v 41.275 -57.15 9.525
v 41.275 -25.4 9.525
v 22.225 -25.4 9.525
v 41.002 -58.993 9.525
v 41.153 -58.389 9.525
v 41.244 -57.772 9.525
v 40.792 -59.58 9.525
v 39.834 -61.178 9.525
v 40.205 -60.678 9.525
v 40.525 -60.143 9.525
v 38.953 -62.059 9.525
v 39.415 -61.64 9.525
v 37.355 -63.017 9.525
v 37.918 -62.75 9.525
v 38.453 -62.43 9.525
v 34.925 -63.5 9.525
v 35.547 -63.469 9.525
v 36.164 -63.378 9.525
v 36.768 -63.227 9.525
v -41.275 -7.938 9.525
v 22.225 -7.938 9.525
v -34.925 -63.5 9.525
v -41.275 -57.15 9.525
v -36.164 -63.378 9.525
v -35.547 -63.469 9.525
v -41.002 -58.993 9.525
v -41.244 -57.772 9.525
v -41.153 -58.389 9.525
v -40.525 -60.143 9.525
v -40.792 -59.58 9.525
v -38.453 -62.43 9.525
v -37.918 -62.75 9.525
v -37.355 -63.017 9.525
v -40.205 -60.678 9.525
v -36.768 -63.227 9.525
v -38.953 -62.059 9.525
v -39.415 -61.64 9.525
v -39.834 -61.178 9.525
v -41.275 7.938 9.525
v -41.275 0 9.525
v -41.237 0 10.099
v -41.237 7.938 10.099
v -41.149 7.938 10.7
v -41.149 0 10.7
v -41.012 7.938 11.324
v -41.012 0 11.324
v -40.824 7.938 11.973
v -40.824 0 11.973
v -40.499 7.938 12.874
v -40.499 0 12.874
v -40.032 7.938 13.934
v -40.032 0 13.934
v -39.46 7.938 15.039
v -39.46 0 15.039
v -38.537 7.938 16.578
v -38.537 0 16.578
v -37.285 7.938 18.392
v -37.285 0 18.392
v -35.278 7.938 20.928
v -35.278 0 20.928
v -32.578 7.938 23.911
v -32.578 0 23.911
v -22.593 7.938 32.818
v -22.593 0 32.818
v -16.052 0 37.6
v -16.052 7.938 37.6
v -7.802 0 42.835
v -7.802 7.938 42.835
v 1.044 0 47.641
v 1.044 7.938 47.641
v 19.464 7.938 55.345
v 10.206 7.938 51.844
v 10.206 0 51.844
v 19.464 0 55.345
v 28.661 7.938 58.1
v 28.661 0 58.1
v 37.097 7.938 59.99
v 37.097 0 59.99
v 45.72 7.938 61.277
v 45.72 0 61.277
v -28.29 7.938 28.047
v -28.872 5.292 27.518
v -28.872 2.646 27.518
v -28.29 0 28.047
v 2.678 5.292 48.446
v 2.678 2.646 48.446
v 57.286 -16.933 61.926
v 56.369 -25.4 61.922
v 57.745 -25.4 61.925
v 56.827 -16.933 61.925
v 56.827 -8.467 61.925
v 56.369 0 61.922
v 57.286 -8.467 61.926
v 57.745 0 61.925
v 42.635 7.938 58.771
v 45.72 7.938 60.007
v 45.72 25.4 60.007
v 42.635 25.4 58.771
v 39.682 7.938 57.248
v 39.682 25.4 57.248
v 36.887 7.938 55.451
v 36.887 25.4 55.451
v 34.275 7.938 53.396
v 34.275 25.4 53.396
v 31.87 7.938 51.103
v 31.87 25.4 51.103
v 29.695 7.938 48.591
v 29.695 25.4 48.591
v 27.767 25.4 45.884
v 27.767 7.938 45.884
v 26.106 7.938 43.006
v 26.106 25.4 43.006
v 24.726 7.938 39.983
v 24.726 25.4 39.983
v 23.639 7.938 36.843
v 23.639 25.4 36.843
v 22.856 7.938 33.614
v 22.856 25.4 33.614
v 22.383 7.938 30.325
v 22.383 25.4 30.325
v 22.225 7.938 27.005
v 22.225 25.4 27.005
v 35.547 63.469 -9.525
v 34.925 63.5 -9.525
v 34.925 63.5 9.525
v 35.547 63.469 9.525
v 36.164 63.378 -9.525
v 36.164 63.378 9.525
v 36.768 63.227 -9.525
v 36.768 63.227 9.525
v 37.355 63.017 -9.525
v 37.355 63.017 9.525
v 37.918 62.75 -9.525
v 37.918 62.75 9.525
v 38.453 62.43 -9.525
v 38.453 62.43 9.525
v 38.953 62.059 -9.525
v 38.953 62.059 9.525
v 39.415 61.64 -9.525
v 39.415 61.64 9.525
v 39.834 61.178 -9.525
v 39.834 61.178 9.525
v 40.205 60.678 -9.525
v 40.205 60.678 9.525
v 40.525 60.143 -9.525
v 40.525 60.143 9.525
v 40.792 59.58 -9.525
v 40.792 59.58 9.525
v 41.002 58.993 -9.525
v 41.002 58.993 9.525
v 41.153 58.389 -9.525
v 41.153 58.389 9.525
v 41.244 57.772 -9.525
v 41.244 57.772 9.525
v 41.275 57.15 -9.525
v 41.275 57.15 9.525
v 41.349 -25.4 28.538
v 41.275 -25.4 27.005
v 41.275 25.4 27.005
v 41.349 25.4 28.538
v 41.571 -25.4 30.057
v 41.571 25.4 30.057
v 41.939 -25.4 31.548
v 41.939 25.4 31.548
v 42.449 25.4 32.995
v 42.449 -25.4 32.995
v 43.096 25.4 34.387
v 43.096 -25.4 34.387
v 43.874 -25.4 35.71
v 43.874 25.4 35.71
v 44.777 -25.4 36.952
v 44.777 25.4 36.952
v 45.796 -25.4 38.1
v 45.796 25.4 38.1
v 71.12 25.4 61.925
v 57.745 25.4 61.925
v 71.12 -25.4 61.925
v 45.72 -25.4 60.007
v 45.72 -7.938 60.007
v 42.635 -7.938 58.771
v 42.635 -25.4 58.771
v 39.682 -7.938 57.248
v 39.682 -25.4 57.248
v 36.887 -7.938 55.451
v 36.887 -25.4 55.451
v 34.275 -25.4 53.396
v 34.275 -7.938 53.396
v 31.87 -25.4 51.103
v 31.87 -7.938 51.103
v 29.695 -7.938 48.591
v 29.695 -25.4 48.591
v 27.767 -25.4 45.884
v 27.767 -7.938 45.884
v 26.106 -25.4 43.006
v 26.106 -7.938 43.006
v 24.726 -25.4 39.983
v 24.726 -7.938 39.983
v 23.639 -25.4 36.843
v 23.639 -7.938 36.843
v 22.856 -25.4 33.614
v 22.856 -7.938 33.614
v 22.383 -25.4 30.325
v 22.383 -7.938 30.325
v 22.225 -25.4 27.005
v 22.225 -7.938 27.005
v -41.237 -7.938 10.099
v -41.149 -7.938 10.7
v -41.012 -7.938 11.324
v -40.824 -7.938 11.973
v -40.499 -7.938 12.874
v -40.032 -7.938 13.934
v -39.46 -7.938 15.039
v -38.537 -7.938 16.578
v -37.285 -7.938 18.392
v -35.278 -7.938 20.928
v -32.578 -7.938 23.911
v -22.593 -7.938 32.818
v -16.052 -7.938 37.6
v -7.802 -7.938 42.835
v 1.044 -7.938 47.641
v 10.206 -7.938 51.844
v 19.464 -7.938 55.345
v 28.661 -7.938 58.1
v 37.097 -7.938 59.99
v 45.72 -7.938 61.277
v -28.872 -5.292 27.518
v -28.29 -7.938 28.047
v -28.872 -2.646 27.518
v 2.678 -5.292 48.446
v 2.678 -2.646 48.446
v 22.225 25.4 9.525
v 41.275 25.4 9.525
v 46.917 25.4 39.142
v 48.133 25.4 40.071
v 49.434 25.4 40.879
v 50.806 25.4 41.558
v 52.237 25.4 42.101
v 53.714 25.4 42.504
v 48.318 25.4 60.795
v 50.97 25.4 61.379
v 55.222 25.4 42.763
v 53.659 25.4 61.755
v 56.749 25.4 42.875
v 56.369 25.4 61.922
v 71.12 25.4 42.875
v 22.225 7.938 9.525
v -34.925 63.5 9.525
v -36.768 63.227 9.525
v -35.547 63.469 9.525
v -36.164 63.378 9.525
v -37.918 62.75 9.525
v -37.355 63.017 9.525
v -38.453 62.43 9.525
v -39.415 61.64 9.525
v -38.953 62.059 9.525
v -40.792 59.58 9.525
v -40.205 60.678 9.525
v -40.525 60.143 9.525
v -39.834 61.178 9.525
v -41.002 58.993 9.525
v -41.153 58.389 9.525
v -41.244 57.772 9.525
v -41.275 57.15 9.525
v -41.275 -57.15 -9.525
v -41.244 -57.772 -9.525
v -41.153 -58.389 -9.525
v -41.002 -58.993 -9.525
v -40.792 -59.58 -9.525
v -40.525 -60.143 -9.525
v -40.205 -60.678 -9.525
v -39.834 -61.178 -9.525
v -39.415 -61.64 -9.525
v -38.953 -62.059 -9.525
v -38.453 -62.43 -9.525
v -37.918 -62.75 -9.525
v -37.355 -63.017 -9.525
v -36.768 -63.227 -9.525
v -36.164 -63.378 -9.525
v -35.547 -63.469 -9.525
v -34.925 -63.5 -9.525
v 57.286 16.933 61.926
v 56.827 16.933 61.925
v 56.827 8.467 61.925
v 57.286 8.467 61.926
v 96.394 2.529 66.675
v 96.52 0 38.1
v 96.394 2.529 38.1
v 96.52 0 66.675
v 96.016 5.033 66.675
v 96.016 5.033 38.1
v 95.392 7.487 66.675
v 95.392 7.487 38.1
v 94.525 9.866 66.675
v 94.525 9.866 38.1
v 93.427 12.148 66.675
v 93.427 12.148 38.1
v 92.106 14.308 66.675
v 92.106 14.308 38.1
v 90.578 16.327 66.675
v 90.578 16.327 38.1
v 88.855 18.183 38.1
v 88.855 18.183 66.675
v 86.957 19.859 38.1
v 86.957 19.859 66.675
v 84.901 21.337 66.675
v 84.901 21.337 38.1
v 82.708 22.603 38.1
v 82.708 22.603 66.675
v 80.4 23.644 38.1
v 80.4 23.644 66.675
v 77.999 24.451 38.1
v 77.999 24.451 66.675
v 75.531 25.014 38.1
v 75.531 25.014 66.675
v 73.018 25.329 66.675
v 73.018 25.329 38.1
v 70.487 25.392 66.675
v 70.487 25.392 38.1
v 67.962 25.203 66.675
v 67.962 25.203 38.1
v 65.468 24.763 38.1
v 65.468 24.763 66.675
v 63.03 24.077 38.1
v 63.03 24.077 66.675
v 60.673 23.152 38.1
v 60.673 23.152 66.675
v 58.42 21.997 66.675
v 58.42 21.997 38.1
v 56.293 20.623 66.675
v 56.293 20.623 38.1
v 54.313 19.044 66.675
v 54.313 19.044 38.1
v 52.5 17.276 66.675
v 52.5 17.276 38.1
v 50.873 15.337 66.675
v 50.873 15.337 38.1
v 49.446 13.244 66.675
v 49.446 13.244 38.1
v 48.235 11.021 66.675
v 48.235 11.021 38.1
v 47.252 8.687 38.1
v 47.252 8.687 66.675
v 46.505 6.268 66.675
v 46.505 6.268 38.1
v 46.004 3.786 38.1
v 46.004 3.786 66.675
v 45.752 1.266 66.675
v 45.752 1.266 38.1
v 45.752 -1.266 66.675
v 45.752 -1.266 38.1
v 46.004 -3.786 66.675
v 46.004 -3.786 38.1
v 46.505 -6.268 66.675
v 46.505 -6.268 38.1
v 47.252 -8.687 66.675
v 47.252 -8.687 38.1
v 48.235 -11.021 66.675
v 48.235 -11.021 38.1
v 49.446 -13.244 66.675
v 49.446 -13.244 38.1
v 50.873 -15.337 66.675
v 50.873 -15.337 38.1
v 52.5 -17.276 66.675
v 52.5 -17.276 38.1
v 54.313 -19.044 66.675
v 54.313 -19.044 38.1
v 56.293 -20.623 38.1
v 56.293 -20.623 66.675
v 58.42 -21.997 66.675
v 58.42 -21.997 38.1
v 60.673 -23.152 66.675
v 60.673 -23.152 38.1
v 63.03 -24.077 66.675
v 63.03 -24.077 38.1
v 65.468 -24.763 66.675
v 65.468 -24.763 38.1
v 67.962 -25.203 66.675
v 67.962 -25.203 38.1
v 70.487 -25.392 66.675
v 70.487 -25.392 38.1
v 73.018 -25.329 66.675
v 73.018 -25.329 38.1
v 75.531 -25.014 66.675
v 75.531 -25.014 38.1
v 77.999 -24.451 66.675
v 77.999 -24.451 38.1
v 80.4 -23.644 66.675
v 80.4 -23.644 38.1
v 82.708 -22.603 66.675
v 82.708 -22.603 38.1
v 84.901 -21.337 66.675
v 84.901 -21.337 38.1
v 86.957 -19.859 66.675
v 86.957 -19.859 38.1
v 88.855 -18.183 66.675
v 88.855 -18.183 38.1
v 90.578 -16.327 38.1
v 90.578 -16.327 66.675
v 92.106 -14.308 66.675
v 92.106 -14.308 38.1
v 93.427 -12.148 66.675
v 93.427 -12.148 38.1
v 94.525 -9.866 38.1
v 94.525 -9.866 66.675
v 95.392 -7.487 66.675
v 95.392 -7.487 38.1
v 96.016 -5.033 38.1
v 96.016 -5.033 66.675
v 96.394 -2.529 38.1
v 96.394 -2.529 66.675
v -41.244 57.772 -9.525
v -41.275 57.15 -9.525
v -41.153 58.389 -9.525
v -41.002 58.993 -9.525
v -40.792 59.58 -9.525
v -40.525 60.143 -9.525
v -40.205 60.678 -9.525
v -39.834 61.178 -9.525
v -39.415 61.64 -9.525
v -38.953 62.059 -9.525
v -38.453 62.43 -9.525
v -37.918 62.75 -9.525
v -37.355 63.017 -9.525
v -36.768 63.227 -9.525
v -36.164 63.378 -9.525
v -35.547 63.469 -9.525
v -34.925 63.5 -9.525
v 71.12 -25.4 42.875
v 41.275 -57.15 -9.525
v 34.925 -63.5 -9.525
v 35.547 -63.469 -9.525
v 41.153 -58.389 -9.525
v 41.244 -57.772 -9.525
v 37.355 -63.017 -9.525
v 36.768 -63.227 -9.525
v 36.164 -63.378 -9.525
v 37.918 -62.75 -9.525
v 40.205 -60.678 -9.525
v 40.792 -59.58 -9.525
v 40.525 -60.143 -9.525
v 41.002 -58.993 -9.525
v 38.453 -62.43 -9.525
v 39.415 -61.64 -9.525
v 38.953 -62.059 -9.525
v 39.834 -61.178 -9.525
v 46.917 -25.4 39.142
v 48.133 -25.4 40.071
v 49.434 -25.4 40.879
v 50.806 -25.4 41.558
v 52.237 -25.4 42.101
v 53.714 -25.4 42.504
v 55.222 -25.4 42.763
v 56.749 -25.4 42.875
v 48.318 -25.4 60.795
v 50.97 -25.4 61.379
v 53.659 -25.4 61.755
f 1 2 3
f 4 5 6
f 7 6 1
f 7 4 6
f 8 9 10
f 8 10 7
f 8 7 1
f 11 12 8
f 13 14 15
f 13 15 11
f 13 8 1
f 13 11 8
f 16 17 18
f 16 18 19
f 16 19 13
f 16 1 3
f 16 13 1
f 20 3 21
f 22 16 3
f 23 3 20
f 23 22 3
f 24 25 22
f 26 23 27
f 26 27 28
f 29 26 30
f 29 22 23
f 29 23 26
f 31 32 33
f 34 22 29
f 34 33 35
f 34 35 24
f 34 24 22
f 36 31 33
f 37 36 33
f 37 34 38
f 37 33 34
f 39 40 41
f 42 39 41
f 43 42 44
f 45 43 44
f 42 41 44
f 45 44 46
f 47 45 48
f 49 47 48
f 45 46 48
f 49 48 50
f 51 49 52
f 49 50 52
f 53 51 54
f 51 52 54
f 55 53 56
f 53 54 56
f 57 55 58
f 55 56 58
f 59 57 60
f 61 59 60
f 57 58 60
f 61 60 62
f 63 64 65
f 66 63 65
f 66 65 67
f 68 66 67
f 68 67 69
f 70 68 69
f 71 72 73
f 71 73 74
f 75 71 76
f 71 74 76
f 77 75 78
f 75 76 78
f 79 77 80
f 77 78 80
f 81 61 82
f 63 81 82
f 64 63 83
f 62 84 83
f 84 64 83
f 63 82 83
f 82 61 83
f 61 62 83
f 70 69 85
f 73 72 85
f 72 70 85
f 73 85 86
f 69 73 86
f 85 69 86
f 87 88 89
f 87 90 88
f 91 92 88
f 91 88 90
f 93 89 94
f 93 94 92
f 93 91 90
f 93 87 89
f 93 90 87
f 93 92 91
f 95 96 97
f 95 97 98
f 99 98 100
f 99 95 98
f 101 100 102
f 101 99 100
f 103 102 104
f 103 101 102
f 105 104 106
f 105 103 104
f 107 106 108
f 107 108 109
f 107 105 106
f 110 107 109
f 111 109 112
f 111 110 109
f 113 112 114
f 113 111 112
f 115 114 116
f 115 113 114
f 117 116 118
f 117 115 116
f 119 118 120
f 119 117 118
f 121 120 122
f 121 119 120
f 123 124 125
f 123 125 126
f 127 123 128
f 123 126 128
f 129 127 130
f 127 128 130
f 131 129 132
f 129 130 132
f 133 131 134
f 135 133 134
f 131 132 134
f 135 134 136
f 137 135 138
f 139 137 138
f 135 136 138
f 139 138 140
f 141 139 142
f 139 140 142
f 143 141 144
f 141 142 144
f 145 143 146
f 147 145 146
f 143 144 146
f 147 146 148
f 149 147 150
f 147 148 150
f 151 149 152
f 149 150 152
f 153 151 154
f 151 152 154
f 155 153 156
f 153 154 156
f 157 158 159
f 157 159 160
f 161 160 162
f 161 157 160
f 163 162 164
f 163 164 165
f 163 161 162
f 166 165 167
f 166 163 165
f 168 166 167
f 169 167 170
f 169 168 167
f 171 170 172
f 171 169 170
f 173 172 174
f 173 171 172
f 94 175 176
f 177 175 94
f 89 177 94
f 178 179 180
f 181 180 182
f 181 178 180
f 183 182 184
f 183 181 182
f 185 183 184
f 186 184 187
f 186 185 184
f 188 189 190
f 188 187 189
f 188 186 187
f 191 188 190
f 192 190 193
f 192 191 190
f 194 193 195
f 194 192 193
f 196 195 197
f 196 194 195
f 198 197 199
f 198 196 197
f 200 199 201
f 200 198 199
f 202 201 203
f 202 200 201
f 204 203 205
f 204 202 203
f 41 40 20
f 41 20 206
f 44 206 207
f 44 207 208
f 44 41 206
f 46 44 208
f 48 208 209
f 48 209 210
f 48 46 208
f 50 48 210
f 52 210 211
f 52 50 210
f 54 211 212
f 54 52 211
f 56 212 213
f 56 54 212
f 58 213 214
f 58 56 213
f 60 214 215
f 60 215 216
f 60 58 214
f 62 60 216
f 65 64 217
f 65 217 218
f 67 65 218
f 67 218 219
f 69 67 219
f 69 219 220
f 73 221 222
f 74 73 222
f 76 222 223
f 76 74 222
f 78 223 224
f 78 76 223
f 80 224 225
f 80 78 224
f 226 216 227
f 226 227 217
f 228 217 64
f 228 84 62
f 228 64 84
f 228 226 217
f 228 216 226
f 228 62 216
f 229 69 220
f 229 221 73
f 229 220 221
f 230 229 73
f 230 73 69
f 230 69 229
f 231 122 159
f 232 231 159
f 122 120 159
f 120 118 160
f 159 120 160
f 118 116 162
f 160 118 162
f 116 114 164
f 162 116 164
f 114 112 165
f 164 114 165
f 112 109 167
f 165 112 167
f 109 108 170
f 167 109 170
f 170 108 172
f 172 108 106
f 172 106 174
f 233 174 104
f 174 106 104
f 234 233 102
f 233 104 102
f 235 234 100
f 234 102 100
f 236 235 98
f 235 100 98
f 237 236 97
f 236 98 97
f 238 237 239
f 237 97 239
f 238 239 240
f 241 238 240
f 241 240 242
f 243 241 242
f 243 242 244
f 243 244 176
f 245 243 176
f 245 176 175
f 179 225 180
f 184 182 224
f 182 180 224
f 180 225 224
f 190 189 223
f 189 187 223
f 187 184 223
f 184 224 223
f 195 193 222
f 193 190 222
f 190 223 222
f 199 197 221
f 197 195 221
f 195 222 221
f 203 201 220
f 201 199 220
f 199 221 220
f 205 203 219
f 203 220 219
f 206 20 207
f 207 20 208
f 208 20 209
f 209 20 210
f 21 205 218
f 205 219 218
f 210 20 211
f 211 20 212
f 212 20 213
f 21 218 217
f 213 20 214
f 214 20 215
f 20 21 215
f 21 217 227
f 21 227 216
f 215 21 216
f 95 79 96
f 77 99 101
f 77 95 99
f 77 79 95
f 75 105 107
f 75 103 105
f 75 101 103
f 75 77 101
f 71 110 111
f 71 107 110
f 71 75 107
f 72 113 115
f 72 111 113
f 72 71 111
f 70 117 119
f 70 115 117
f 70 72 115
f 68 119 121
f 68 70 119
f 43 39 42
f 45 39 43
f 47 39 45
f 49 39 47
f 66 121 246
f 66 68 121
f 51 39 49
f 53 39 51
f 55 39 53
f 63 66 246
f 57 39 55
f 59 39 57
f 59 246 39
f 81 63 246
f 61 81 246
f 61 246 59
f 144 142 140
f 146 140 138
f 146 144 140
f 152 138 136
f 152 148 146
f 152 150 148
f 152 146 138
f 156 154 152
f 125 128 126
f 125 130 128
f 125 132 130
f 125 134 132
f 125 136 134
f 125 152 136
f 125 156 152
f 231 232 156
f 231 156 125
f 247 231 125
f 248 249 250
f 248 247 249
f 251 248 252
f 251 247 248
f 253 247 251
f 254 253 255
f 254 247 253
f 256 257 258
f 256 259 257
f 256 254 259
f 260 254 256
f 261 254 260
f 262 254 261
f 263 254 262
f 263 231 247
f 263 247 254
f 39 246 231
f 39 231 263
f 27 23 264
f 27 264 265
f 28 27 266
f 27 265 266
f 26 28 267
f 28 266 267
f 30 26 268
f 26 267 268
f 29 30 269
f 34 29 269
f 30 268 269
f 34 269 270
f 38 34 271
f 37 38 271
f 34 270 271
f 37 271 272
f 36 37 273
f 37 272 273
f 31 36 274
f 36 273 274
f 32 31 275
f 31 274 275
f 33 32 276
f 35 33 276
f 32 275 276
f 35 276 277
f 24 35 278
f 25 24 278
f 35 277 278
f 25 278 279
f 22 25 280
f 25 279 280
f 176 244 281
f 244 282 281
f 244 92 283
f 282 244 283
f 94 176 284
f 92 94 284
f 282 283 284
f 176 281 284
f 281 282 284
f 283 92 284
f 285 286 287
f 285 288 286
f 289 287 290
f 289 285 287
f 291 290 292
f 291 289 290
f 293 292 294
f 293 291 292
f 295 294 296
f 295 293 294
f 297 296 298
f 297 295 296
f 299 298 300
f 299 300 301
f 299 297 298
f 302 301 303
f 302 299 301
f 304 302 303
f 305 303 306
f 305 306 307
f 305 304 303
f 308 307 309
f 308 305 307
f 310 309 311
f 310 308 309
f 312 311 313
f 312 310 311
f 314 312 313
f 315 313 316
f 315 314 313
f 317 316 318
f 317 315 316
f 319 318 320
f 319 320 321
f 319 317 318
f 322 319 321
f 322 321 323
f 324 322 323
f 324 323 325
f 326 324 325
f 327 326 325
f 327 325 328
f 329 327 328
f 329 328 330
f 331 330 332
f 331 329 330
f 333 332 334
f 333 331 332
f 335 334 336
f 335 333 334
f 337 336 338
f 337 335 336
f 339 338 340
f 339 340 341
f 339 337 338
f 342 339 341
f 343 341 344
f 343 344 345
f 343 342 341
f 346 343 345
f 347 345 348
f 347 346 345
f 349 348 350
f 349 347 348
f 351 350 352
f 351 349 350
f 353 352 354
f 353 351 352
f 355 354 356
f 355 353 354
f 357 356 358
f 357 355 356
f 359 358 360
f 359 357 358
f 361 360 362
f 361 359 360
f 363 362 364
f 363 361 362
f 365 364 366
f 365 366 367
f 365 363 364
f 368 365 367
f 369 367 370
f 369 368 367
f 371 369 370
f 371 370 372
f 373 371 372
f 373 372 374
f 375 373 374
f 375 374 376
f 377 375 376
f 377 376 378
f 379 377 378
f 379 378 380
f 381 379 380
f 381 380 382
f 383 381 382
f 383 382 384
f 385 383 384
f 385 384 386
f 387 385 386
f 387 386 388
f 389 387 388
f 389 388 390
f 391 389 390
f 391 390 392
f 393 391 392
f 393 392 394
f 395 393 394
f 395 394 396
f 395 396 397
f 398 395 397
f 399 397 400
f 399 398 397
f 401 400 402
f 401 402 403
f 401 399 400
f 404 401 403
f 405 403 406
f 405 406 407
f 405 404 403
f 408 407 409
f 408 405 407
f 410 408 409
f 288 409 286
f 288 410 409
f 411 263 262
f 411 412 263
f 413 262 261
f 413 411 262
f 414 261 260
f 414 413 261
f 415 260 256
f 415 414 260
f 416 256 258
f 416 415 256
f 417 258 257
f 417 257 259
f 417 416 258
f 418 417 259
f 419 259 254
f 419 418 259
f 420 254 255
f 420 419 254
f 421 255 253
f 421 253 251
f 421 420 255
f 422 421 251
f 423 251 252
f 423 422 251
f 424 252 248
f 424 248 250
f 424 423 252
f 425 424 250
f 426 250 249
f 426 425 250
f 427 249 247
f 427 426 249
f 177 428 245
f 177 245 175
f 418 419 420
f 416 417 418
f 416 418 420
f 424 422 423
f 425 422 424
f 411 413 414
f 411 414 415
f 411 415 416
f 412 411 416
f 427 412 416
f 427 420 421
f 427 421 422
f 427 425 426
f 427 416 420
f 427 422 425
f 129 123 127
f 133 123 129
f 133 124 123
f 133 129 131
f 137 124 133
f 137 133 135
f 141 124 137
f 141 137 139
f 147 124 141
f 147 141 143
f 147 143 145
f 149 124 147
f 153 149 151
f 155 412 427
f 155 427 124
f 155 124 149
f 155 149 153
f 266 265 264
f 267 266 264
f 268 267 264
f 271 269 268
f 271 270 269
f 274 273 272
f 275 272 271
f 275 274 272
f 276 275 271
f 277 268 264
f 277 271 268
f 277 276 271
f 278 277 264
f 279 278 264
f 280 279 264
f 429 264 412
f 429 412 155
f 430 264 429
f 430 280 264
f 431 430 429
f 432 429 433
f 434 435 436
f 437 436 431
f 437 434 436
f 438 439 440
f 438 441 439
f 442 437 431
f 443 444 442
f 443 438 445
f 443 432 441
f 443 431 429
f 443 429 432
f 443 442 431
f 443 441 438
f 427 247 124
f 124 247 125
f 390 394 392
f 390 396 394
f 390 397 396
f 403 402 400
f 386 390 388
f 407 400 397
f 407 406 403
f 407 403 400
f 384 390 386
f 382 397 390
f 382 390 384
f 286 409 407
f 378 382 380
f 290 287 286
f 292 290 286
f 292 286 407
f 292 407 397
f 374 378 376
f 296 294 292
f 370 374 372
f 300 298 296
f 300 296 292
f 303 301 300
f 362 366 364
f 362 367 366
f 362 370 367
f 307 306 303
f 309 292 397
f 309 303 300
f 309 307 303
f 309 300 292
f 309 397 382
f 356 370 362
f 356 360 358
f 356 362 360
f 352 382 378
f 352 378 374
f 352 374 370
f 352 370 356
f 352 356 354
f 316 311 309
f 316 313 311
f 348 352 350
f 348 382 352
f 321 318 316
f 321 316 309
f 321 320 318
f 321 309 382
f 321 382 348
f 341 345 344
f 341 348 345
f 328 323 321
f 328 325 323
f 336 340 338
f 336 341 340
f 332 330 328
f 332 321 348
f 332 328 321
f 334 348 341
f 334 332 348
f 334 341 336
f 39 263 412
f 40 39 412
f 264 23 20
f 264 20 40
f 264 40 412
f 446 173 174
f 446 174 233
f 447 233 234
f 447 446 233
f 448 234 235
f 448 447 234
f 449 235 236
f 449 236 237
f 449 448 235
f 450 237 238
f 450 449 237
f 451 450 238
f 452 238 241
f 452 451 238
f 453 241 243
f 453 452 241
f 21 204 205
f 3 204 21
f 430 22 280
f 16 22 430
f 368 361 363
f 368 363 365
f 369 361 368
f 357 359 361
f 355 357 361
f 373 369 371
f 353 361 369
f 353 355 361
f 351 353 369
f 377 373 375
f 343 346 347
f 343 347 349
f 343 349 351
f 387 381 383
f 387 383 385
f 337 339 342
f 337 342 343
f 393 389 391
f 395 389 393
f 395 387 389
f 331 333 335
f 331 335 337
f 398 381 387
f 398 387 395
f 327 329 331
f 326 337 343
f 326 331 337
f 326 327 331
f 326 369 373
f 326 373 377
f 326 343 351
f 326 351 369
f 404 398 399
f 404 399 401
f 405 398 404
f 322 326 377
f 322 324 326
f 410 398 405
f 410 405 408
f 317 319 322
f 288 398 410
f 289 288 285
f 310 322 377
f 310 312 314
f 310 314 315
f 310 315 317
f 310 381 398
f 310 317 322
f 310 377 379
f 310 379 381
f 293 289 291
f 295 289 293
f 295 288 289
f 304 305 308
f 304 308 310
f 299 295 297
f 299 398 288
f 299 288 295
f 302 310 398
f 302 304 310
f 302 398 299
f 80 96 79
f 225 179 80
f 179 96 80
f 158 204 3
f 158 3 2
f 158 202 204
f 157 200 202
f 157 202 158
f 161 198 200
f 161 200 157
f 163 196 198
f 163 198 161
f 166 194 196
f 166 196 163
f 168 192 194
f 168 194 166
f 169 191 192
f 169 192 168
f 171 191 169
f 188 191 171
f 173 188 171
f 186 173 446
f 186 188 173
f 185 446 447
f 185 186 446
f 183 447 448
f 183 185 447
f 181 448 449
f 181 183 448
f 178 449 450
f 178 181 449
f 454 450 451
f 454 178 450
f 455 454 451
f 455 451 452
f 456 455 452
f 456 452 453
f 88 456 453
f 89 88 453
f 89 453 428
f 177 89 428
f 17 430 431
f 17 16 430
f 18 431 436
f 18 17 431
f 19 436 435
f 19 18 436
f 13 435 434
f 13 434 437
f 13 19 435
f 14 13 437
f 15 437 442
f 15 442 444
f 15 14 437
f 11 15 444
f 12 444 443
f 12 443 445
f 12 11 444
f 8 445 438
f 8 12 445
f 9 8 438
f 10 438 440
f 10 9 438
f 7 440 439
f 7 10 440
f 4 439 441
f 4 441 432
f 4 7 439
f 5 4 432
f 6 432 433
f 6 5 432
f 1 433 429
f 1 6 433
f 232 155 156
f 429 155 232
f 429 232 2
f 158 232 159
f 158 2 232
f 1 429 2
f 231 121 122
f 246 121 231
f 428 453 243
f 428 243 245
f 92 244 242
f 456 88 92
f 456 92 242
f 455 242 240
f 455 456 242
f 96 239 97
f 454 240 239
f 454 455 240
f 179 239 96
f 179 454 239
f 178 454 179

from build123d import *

# Parameters (mm, degrees)
F1_DEPTH = 63.5
F2_DEPTH = 25.4
F3_DEPTH = 7.9375
F5_R     = 6.35


with BuildPart() as f1:
    # F0 (on Front) → F1 (new body, symmetric)
    with BuildSketch(Plane.XZ):
        Polygon((22.225, 9.525), (-41.275, 9.525), (-41.275, -9.525), (41.275, -9.525), (41.275, 9.525), align=None)
    extrude(amount=F1_DEPTH, both=True)

    # F0 (on Front) → F2 (join, symmetric)
    with BuildSketch(Plane.XZ):
        with BuildLine():
            Line((22.225, 27.005265), (22.225, 9.525))
            Line((22.225, 9.525), (41.275, 9.525))
            Line((41.275, 9.525), (41.275, 27.005265))
            ThreePointArc((41.275, 27.005265), (42.448524, 32.995443), (45.795596, 38.1))
            Line((45.795596, 38.1), (45.72, 38.1))
            Line((45.72, 38.1), (45.72, 60.006943))
            ThreePointArc((45.72, 60.006943), (28.69874, 47.26067), (22.225, 27.005265))
        make_face()
        with BuildLine():
            ThreePointArc((56.369008, 61.921532), (50.969911, 61.379124), (45.72, 60.006943))
            Line((45.72, 60.006943), (45.72, 38.1))
            Line((45.72, 38.1), (45.795596, 38.1))
            ThreePointArc((45.795596, 38.1), (50.805869, 41.557503), (56.749004, 42.8752))
            Line((56.749004, 42.8752), (71.12, 42.8752))
            Line((71.12, 42.8752), (71.12, 61.9252))
            Line((71.12, 61.9252), (57.7448, 61.9252))
            add(Edge.make_bspline(
                [(56.369008, 61.921532), (56.827318, 61.92587), (57.285926, 61.927108), (57.7448, 61.9252)],
                knots=[111.022009, 111.022009, 111.022009, 111.022009, 112.029914, 112.029914, 112.029914, 112.029914], degree=3))
        make_face()
    extrude(amount=F2_DEPTH, both=True)

    # F0 (on Front) → F3 (join, symmetric)
    with BuildSketch(Plane.XZ):
        with BuildLine():
            add(Edge.make_bspline(
                [(-41.275, 9.525), (-40.999132, 22.371612), (-0.51452, 56.173199), (45.72, 61.276772)],
                knots=[0, 0, 0, 0, 103.164616, 103.164616, 103.164616, 103.164616], degree=3))
            Line((-41.275, 9.525), (22.225, 9.525))
            Line((22.225, 9.525), (22.225, 27.005265))
            ThreePointArc((22.225, 27.005265), (28.69874, 47.26067), (45.72, 60.006943))
            Line((45.72, 60.006943), (45.72, 61.276772))
        make_face()
    extrude(amount=F3_DEPTH, both=True)

    # F5
    f5_edges = [f1.edges().sort_by_distance(p)[0] for p in [
        (-41.275, -63.5, 0),
        (41.275, -63.5, 0),
        (41.275, 63.5, 0),
        (-41.275, 63.5, 0),
    ]]
    fillet(f5_edges, radius=F5_R)


with BuildPart() as f4:
    # F0 (on Front) → F4 (revolve)
    with BuildSketch(Plane.XZ):
        Polygon((96.52, 66.675), (71.12, 66.675), (71.12, 61.9252), (71.12, 42.8752), (71.12, 38.1), (96.52, 38.1), align=None)
    revolve(axis=Axis((71.12, 0, 52.3875), (0, 0, 1)))


solid = Compound([f1.part, f4.part])
